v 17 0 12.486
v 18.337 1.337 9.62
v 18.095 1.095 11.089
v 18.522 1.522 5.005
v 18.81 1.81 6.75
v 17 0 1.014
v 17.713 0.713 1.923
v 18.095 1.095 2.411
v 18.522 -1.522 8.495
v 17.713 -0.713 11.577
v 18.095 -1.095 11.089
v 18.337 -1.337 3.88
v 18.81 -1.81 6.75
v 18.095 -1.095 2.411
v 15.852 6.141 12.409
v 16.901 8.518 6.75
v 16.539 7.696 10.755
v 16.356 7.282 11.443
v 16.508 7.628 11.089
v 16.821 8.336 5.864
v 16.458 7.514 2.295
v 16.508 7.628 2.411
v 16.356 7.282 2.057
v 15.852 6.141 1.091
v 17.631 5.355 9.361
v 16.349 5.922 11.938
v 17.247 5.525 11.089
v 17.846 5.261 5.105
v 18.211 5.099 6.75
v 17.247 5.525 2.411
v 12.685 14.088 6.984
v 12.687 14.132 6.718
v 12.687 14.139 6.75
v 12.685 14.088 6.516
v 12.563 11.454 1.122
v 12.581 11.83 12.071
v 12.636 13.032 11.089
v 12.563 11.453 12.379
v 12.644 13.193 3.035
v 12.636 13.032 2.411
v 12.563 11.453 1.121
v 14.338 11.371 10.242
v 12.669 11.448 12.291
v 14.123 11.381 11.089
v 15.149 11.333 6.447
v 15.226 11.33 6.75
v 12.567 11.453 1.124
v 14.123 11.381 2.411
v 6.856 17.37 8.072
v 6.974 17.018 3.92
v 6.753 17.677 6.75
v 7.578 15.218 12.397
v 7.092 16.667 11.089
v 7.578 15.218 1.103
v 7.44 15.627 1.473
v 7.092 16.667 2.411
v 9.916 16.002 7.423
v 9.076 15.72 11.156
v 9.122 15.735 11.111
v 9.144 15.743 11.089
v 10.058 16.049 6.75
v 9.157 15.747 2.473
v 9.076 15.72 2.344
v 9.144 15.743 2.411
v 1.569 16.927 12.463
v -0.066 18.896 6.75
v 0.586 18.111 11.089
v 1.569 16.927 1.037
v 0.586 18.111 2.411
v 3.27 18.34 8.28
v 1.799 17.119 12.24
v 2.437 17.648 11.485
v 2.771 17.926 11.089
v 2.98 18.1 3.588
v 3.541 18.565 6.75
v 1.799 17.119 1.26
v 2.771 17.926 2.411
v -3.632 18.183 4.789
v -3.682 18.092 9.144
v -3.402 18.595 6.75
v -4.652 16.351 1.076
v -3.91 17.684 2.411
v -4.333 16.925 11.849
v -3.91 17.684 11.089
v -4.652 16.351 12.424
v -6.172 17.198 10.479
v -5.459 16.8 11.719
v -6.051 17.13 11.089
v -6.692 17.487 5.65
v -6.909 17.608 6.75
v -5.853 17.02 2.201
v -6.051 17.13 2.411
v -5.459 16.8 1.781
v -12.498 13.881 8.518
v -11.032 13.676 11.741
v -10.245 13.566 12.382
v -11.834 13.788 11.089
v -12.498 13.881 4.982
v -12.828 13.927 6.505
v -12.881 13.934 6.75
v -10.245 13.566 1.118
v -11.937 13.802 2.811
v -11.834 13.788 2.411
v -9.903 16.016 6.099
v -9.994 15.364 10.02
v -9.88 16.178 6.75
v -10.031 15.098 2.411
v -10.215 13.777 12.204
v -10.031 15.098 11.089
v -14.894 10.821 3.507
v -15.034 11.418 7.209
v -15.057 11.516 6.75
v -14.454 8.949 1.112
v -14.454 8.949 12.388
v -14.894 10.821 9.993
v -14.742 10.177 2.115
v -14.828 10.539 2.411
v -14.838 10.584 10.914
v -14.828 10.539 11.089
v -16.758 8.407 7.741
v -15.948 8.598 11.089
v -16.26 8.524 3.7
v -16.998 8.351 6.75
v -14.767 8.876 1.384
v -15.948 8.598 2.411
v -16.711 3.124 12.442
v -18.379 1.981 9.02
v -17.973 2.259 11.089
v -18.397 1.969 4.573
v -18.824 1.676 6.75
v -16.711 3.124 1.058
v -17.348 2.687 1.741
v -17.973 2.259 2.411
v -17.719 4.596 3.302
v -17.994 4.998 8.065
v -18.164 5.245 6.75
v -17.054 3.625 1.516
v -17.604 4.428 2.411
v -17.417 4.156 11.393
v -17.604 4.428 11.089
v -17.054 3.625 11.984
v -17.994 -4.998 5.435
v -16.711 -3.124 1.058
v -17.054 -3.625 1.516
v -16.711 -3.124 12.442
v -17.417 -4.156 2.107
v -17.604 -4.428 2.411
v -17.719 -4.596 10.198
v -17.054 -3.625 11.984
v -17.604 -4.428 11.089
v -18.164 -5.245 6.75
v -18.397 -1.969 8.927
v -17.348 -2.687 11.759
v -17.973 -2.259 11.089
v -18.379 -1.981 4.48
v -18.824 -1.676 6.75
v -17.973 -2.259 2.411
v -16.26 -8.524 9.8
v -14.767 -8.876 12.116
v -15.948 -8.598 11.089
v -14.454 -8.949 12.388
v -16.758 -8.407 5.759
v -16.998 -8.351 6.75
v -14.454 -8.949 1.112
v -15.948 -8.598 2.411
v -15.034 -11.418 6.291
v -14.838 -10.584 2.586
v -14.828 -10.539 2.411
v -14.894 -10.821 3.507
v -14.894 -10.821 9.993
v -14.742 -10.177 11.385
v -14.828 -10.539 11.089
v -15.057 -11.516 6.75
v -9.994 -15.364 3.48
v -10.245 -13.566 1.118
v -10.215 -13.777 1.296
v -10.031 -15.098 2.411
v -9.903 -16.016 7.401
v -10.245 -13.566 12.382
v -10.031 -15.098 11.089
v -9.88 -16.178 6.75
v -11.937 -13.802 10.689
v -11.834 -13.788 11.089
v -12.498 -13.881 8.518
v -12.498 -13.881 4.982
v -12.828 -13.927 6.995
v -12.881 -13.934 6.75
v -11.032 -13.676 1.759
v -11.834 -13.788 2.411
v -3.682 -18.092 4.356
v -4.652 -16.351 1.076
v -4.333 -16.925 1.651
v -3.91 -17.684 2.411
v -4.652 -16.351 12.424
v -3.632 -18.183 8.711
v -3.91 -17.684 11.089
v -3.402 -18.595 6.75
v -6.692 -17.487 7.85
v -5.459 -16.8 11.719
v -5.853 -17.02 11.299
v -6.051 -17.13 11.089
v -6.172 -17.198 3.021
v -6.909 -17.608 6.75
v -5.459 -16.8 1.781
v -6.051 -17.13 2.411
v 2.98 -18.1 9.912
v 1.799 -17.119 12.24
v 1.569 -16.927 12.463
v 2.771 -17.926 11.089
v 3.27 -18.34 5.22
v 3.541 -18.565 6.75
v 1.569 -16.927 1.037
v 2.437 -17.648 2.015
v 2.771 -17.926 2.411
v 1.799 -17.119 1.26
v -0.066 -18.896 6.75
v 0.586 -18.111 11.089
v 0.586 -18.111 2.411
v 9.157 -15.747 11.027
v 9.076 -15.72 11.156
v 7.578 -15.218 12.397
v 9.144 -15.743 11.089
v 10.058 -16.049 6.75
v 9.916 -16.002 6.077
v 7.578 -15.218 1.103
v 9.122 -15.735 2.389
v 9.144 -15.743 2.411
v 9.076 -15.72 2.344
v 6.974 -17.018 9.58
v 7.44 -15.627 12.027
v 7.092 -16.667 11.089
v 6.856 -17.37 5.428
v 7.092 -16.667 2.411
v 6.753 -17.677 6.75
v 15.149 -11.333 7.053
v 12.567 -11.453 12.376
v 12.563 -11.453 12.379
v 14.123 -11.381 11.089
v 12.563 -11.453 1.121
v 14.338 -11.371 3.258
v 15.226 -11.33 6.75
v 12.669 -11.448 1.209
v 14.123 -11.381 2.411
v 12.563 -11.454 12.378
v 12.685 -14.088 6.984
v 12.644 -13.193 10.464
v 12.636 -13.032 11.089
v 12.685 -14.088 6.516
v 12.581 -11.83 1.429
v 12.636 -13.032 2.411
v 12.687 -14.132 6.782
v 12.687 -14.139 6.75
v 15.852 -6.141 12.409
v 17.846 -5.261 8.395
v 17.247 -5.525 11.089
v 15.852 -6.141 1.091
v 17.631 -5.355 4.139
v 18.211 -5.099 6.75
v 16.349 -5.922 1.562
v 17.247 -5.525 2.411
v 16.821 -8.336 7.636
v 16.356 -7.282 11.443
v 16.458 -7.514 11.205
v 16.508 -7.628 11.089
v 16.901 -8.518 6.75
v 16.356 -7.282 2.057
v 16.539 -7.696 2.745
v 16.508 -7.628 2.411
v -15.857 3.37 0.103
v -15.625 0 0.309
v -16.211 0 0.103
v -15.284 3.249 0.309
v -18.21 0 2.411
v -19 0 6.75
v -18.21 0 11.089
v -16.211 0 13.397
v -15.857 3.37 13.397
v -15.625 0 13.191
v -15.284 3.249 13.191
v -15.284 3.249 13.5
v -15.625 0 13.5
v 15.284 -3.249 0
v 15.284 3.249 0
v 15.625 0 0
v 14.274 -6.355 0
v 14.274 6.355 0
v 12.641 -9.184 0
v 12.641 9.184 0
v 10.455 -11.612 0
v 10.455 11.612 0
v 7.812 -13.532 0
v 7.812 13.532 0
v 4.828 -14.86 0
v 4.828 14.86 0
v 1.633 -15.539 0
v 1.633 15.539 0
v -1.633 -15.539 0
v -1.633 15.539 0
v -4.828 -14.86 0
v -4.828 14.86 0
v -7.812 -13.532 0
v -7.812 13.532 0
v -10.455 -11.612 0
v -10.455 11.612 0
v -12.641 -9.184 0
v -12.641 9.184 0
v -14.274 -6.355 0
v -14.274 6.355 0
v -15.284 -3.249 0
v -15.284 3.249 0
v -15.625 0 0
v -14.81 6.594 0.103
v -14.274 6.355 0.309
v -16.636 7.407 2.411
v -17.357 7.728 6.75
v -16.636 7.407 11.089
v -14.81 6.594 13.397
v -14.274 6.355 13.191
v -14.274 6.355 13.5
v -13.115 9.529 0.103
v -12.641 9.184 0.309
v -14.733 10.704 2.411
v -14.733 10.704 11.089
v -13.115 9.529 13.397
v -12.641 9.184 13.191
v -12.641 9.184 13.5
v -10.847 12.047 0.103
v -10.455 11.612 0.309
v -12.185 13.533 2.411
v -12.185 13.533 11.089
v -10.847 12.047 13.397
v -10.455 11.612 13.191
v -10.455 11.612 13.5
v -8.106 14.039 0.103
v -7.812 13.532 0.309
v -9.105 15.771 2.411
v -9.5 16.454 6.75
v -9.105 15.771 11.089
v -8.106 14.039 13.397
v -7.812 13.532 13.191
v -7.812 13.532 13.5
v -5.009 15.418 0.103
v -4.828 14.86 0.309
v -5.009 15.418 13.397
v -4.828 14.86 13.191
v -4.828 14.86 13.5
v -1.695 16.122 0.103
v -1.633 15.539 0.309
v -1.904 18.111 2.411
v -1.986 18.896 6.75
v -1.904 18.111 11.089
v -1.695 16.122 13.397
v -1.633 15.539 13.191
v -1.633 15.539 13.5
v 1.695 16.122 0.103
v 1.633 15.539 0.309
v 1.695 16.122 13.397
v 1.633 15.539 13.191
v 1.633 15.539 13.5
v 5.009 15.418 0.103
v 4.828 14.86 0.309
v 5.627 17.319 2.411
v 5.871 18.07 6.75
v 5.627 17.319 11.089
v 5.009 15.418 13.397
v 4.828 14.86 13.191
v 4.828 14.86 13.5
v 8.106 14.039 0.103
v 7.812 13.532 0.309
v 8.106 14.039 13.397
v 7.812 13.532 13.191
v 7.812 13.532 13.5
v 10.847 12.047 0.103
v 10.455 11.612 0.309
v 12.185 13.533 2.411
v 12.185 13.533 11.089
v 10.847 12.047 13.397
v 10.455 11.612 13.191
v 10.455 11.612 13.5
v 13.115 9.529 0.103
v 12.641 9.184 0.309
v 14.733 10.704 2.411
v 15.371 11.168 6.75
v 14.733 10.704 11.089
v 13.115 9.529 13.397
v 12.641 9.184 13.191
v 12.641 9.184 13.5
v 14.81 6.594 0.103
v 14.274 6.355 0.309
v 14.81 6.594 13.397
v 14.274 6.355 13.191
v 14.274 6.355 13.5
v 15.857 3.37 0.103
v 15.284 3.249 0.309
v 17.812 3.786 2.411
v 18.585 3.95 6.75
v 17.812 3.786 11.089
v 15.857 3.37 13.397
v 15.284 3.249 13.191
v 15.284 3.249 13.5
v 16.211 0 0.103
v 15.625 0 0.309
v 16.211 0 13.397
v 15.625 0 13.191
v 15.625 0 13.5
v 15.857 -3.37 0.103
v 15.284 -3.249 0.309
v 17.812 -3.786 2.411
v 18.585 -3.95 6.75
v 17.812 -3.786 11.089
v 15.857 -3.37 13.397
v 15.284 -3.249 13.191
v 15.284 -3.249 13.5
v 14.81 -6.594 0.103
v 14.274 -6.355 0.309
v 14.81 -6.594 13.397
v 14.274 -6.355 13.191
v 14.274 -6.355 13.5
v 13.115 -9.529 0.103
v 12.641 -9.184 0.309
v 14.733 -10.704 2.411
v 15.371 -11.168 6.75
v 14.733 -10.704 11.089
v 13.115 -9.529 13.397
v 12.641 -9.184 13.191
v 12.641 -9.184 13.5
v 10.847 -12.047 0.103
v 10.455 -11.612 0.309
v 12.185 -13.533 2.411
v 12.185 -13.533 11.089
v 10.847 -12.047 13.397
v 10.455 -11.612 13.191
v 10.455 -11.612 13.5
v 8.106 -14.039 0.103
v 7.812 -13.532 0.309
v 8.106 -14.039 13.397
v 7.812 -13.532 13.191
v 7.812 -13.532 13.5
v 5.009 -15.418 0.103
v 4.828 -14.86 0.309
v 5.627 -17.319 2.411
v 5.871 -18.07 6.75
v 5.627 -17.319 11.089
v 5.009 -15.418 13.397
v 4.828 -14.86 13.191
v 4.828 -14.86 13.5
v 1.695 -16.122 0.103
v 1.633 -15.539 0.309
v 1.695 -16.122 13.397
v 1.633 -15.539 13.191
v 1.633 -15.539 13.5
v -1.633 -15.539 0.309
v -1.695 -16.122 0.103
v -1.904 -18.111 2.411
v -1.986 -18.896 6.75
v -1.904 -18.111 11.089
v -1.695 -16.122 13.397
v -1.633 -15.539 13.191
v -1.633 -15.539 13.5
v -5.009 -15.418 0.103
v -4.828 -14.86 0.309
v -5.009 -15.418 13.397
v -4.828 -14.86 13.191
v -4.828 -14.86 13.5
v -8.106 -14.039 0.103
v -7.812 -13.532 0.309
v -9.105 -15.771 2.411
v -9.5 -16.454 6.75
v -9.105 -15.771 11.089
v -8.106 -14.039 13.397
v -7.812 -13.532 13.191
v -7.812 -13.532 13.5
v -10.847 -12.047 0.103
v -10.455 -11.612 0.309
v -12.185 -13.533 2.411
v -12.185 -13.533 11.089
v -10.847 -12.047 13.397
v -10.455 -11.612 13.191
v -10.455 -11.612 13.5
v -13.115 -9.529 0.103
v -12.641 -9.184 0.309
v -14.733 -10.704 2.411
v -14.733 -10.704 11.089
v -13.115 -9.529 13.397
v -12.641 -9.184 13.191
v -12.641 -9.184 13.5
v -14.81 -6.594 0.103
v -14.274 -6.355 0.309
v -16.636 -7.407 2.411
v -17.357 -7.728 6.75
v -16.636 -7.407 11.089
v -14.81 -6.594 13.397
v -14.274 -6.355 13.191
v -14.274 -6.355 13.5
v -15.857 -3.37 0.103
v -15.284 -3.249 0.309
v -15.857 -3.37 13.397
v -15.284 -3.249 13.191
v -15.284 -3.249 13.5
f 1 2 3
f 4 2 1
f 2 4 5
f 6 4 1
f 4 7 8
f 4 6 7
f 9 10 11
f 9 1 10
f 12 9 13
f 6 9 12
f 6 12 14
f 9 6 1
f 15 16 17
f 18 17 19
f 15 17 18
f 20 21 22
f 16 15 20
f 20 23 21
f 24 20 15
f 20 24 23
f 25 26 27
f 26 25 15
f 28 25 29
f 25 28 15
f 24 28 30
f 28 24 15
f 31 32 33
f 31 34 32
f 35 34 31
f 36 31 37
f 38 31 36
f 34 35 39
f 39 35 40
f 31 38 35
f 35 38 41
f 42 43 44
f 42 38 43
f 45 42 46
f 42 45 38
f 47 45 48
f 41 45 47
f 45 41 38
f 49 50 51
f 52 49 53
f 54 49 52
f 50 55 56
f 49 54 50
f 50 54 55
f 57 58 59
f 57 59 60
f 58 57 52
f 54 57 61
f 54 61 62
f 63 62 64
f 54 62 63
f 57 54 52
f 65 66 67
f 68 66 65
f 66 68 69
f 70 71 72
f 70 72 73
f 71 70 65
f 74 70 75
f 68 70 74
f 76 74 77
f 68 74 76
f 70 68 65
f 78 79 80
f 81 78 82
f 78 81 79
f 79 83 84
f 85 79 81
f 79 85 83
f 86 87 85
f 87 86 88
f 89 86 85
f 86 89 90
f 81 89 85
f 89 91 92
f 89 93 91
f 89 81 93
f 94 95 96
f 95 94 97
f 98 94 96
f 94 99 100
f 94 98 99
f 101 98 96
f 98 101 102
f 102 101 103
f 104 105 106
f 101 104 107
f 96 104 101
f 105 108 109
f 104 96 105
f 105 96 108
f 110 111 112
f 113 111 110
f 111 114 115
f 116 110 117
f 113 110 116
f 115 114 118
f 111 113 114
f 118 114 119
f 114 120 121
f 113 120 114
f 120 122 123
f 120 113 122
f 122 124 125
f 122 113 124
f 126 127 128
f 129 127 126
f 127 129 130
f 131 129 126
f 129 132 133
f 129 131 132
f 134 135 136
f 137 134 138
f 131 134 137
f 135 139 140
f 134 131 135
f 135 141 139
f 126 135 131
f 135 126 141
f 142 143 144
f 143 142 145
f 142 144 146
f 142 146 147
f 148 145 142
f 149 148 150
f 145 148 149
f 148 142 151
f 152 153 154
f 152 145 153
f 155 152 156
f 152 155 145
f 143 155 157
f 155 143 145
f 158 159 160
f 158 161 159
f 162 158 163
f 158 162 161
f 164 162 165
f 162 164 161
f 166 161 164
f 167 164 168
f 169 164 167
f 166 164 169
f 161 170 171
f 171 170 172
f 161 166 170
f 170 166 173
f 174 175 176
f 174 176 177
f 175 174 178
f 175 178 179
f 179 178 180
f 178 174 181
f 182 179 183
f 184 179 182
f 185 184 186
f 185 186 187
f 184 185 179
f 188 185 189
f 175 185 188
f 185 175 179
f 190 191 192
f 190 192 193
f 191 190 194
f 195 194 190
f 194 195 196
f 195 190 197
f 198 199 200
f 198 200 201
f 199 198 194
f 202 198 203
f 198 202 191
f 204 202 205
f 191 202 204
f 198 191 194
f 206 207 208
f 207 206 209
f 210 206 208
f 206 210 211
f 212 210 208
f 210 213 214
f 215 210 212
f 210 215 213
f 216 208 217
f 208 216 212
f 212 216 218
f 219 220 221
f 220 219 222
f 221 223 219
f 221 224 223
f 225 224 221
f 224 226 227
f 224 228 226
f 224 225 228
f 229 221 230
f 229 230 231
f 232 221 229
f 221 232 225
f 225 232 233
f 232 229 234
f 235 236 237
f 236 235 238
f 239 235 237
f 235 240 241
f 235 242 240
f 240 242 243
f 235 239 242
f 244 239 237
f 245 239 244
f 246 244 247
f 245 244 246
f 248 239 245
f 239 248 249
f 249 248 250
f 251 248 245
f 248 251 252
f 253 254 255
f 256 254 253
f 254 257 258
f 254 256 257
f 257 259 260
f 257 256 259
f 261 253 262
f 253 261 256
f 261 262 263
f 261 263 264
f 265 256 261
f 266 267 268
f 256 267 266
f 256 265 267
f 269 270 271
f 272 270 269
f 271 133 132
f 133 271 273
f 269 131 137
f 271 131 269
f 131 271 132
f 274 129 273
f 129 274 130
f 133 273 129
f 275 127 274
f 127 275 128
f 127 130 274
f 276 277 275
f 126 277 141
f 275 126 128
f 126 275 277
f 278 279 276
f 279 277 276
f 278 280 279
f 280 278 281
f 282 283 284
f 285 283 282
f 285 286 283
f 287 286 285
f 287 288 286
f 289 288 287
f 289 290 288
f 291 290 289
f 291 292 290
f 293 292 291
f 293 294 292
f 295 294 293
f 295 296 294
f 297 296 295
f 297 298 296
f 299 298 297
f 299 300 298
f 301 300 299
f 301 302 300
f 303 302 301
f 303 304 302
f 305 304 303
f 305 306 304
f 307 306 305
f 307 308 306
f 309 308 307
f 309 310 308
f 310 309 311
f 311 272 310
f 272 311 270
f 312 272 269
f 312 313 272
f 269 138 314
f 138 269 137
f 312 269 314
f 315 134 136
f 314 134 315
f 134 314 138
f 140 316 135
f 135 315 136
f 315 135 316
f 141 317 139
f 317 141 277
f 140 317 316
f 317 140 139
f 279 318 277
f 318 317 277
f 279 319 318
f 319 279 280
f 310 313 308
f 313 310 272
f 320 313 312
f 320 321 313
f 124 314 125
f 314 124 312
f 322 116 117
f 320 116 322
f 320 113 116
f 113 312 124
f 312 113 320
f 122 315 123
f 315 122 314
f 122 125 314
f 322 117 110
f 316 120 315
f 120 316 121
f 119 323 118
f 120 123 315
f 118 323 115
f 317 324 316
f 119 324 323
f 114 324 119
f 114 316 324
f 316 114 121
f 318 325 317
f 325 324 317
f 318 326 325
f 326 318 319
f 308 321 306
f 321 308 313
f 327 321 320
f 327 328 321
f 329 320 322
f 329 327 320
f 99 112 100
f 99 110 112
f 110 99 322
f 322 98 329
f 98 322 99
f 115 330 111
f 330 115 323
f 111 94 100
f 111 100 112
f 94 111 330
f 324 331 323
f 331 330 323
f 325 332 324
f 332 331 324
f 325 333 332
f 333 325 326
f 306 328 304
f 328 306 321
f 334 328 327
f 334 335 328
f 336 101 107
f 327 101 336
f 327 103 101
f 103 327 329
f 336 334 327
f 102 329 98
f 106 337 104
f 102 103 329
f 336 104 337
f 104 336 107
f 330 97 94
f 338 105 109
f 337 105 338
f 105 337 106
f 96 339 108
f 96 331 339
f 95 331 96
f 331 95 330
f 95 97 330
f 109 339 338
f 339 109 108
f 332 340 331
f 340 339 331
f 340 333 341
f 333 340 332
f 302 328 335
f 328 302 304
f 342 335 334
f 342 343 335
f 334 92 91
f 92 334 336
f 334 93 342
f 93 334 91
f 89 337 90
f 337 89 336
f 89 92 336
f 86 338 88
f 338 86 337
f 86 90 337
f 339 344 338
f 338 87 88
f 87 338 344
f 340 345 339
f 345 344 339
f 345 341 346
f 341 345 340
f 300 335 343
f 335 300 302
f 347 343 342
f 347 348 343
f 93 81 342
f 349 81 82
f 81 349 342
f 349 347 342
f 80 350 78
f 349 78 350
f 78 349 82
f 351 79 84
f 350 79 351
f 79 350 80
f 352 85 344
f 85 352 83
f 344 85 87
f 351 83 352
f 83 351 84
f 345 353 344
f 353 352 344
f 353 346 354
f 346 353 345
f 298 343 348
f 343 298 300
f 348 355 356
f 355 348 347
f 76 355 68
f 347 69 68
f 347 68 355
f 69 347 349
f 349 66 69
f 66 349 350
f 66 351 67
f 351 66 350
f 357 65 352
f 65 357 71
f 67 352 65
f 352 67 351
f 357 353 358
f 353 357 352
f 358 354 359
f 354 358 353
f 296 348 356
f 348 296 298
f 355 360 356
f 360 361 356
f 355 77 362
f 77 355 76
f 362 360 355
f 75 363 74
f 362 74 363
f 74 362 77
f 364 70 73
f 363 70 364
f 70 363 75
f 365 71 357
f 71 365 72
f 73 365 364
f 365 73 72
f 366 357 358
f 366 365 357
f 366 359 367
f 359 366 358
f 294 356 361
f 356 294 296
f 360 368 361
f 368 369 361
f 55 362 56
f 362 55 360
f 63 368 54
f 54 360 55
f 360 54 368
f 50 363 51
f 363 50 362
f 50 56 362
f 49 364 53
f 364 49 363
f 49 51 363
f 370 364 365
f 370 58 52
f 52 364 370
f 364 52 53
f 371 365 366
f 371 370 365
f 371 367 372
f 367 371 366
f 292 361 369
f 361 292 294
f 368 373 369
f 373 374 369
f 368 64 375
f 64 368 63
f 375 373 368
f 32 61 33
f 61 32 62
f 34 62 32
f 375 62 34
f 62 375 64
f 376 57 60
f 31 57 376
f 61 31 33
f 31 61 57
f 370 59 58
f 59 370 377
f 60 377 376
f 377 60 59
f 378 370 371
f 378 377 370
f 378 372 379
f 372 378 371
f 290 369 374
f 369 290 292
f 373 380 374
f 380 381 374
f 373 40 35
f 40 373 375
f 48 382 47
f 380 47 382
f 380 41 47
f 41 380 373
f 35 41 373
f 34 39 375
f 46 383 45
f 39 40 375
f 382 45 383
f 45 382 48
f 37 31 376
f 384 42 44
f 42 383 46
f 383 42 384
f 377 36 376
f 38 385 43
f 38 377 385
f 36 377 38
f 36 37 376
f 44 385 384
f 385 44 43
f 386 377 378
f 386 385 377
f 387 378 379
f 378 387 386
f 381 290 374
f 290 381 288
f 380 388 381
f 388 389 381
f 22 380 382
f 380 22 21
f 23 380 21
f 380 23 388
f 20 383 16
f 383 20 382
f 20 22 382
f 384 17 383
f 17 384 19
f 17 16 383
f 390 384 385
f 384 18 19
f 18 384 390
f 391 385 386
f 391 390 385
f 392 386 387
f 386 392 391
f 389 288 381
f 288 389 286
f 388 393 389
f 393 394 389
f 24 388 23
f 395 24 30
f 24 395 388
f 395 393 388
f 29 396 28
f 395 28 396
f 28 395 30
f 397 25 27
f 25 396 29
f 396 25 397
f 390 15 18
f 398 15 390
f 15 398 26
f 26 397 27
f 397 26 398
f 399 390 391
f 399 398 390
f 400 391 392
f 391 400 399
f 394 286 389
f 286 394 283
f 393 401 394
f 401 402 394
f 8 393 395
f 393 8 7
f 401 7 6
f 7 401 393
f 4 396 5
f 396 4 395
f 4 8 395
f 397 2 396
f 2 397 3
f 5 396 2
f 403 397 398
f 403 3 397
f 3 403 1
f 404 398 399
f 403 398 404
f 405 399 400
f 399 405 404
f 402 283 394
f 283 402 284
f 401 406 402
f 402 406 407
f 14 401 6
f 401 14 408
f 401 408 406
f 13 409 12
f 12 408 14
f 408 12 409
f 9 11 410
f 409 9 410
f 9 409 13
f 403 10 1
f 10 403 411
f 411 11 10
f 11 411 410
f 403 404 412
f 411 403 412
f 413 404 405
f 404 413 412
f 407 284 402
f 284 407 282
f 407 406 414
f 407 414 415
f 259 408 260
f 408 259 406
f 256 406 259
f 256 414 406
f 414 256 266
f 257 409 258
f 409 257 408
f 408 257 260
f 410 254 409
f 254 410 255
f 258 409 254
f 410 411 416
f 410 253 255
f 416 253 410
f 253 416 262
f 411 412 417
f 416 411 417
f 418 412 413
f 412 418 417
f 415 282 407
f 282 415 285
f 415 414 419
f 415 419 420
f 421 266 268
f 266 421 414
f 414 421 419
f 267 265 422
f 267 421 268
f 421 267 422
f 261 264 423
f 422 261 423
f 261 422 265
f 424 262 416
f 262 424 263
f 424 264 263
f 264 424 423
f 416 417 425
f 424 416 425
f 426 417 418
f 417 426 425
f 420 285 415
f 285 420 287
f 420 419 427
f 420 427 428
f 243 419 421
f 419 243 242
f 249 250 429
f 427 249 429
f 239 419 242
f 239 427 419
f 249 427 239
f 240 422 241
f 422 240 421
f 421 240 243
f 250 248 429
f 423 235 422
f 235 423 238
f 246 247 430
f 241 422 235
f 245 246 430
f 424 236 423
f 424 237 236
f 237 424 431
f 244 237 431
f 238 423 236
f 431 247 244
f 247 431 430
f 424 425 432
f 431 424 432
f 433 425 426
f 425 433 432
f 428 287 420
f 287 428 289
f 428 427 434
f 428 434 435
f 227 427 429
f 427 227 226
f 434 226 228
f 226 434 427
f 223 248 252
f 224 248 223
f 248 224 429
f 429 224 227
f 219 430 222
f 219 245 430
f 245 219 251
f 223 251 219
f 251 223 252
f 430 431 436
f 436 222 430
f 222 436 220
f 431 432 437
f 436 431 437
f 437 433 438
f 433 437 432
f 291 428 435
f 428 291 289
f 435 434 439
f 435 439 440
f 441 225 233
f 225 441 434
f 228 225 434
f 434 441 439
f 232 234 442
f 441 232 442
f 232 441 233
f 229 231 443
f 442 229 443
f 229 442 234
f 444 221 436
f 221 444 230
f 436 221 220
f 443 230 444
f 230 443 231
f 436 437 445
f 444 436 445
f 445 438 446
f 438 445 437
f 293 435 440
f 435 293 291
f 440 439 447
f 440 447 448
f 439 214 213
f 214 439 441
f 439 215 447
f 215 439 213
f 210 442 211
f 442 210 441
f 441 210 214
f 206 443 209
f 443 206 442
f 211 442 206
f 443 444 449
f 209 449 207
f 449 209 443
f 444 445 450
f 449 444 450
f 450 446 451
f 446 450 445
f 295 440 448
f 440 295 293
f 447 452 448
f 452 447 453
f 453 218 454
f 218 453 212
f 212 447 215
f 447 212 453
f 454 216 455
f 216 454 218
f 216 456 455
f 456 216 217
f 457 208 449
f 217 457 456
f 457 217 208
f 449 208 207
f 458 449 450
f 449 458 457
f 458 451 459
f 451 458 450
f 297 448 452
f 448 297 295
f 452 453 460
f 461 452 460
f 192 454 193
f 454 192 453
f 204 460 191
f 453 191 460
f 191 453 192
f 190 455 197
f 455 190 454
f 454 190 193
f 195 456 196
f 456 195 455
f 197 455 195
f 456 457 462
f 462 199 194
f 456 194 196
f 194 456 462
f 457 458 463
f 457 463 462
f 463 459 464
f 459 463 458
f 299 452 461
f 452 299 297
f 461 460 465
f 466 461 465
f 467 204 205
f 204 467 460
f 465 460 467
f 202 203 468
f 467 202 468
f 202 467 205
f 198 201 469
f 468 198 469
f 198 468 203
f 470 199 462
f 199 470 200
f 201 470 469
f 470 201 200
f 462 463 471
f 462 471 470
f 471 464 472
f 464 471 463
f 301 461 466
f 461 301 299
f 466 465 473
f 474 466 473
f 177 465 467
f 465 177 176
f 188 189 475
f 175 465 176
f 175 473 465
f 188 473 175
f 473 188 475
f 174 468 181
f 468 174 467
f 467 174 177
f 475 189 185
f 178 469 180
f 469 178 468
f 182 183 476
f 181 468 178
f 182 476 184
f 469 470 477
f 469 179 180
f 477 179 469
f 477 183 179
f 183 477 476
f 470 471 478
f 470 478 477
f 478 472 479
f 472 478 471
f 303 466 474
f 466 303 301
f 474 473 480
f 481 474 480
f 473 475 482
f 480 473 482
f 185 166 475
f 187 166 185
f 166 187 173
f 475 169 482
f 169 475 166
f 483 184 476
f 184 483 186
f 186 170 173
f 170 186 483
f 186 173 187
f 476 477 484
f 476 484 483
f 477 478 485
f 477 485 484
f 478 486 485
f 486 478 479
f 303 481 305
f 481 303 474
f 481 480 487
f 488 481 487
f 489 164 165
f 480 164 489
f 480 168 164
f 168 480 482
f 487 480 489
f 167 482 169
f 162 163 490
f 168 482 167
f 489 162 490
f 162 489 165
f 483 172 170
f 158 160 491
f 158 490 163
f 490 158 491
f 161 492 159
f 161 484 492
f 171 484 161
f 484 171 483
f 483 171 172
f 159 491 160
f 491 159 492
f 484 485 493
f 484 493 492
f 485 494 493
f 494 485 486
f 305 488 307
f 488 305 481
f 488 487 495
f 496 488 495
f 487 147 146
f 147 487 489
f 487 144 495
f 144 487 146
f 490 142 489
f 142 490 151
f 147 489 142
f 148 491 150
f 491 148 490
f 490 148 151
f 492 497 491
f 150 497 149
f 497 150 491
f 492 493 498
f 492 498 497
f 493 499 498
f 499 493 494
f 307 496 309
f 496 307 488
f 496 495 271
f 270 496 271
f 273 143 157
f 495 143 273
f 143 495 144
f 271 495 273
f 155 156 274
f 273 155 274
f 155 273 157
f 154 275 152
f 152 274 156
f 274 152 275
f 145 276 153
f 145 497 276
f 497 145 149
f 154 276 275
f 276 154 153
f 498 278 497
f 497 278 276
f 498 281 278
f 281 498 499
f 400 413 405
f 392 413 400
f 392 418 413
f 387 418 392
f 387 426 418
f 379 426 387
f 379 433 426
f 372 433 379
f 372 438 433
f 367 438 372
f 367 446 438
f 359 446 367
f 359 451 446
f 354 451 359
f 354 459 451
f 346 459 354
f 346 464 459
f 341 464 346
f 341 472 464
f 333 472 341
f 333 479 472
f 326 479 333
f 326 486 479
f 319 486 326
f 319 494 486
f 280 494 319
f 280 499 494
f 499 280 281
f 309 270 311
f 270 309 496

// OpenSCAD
// Robot tracks w/ flexible fillament
// hristo.staykov@gmail.com

pi = 3.141592653589793238;

//Calculate the variables bellow based on your requirements
//Note that by changing any values, you may also need to compute perfectWheelRadius manually.

trackWidth = 13.5;
trackOffset = 3;        //distance from chassis

wheelRadius = 19;//13.5; //includes the "sprokets" on the wheel

wheelWidth = trackWidth;//8;
wheelOffset = trackOffset + (trackWidth-wheelWidth)/2;
wheelSpacing = 40;//70;
wheelTeeth = 27;//TODO:vary based on wheelSpacing?
wheelSprockets = 17;

// C=2*pi*R + 2*flat
trackLength = 2*wheelRadius*pi + 2*wheelSpacing;

//trackLength = 210;    //Sillicone bracelets usualy have a circumference of 210mm and width of 12mm and can serve as a replacement for the printed tracks. If using a hard-coded value for trackLength, make sure to reflect changes on wheelSpacing.
//wheelSpacing = (trackLength - 2*wheelRadius*3.141592653589793238)/2;

trackRadius = trackLength/2/pi;
trackSprockets = round(wheelSprockets * trackRadius / wheelRadius);

perfectWheelRadius = wheelRadius;//13.5175311111111;  //the closest value to wheelRadius where the wheel sprockets and the track's ones are about the same size.
//TODO: Compute this automatically

//Bolts used for attaching wheels

boltDiameter = 3;	//M3, DIN912, like printrbot's ones
boltHeadHeight = 3;
boltHeadDiameter = 5.5;
boltLength=30;//excl. head
boltUnthreadedSegment=boltLength-18;


module wheel(r, w, offset, motor){
    //Set `motor` to true in order to include a 3mm D-shaft for attaching to pololu micro gearmotors
    inset=2;
    difference(){
	union(){
            rotate_extrude(convexity = 10)
		union(){
			square([r-w/4, w]);
			translate([r-w*1/4, w/2, 0])scale([0.5, 1, 1])circle(w/2, $fn=9);
		}
            difference(){
                translate([0, 0, w])cylinder(r1=5, r2=3, h=offset);
                if(!motor){
                    //cut space for a nut and a washer
                    translate([0, 0, w+offset-3])cylinder(r=5, h=3);
                }
            }//end diff

	}
	union(){
/*
            if (motor){
		translate([0, 0, w+offset-9])motorShaft();
		//the motor wheel will be connected with a module for additional support
            }else{
		
		cylinder(r=1.7, h=offset+w, $fn=32);
		cylinder(r=boltHeadDiameter/2+1, h=(wheelWidth+wheelOffset-boltUnthreadedSegment-3)+1, $fn=32);
		//1 extra mm for a washer
            }
*/

            for(i=[0:wheelSprockets]){
		rotate([0, 0, i*360/wheelSprockets])translate([r, 0, 0])cylinder(r=sprocketSize/2, h=w, $fn=4);
            }
	}	
    }//end diff
}
module wheelCap(inset, width, radius){
	cylinder(h=inset+width, r=5.5/2);
	cylinder(h=width, r=radius);
}
module helperWheel(r, w, wall, offset){
	cylinder(r=r, h=w);
	translate([0, 0, -1])cylinder(r=r+wall, h=1);

}
module motorShaft(){
    //3mm D-shaft for pololu micro gearmotors
    difference(){
	cylinder(h=9,r=1.7, $fn=64);
	translate([-5, 1.25, 0])cube(10);
    }
}


sprocketSize = 4;
module track(r, w=0, fullTrackWidth=0, gripSize=1, gripWidth=0, teeth=0, wr=0, ws=0){
    //Print with flexible fillament
    
    fullTrackWidth = fullTrackWidth ? fullTrackWidth : trackWidth;
    
    C = 2*r*pi;
    //gripSize = 1;//mm
    gripCount = floor(C/2/gripSize);
    //teeth = r;
    teeth = teeth ? teeth : r;
    wr = wr ? wr : wheelRadius;
    ws = ws ? ws : wheelSprockets;
    gripWidth = gripWidth ? gripWidth : fullTrackWidth-2;

    //trackRadius = trackLength/2/pi;
    trackSprockets = round(ws * r / wr);

    echo("fullTrackWidth:", fullTrackWidth);
    difference(){
        cylinder(r=r+1, h=fullTrackWidth, $fn=gripCount);
        cylinder(r=r-w/4, h=fullTrackWidth, $fn=trackSprockets);
        cylinder(r1=r-0.5,r2=r-w/4, h=(fullTrackWidth-w)/2, $fn=trackSprockets);
        translate([0, 0, fullTrackWidth-(fullTrackWidth-w)/2])cylinder(r2=r-0.5,r1=r-w/4, h=(fullTrackWidth-w)/2, $fn=trackSprockets);
        translate([0, 0,  (fullTrackWidth-w)/2]) rotate_extrude(convexity = 10)
		union(){
			square([r-w/4, w]);
			translate([r-w*1/4, w/2, 0])scale([0.5, 1, 1])circle(w/2, $fn=9);
		}
    }//end diff

    translate([0, 0, (fullTrackWidth-w)/2])
        intersection(){
            for(i=[0:trackSprockets]){
		rotate([0, 0, i*360/trackSprockets])translate([r-w*1/4+sprocketSize/2, 0, 0])scale([1, 0.72, 1])cylinder(r=sprocketSize/2, h=w, $fn=4);
            }
            cylinder(r=r, h=w);
        }
    for(i=[0:gripCount]){
        rotate([0, 0, i*360/gripCount])
        translate([r+1, 0, -gripWidth/2+fullTrackWidth/2])
        cylinder(r=gripSize/2, h=gripWidth, $fn=12);
    }

}


//track(trackRadius, wheelWidth);

/*
//mock tread to compare with tread cutout
translate([0,0,50])
color("red")
cylinder(r=trackRadius-.65, h=10, center=true);
*/

translate([0,0,0])wheel(perfectWheelRadius, wheelWidth, wheelOffset, false);

/*
translate([-wheelRadius-2,0,0])
wheel(perfectWheelRadius, wheelWidth, wheelOffset, false);
*/

/*
//mock wheel to compare with spoked wheel
translate([0,0,50])
color("red")
cylinder(r=wheelRadius, h=10, center=true);
*/
